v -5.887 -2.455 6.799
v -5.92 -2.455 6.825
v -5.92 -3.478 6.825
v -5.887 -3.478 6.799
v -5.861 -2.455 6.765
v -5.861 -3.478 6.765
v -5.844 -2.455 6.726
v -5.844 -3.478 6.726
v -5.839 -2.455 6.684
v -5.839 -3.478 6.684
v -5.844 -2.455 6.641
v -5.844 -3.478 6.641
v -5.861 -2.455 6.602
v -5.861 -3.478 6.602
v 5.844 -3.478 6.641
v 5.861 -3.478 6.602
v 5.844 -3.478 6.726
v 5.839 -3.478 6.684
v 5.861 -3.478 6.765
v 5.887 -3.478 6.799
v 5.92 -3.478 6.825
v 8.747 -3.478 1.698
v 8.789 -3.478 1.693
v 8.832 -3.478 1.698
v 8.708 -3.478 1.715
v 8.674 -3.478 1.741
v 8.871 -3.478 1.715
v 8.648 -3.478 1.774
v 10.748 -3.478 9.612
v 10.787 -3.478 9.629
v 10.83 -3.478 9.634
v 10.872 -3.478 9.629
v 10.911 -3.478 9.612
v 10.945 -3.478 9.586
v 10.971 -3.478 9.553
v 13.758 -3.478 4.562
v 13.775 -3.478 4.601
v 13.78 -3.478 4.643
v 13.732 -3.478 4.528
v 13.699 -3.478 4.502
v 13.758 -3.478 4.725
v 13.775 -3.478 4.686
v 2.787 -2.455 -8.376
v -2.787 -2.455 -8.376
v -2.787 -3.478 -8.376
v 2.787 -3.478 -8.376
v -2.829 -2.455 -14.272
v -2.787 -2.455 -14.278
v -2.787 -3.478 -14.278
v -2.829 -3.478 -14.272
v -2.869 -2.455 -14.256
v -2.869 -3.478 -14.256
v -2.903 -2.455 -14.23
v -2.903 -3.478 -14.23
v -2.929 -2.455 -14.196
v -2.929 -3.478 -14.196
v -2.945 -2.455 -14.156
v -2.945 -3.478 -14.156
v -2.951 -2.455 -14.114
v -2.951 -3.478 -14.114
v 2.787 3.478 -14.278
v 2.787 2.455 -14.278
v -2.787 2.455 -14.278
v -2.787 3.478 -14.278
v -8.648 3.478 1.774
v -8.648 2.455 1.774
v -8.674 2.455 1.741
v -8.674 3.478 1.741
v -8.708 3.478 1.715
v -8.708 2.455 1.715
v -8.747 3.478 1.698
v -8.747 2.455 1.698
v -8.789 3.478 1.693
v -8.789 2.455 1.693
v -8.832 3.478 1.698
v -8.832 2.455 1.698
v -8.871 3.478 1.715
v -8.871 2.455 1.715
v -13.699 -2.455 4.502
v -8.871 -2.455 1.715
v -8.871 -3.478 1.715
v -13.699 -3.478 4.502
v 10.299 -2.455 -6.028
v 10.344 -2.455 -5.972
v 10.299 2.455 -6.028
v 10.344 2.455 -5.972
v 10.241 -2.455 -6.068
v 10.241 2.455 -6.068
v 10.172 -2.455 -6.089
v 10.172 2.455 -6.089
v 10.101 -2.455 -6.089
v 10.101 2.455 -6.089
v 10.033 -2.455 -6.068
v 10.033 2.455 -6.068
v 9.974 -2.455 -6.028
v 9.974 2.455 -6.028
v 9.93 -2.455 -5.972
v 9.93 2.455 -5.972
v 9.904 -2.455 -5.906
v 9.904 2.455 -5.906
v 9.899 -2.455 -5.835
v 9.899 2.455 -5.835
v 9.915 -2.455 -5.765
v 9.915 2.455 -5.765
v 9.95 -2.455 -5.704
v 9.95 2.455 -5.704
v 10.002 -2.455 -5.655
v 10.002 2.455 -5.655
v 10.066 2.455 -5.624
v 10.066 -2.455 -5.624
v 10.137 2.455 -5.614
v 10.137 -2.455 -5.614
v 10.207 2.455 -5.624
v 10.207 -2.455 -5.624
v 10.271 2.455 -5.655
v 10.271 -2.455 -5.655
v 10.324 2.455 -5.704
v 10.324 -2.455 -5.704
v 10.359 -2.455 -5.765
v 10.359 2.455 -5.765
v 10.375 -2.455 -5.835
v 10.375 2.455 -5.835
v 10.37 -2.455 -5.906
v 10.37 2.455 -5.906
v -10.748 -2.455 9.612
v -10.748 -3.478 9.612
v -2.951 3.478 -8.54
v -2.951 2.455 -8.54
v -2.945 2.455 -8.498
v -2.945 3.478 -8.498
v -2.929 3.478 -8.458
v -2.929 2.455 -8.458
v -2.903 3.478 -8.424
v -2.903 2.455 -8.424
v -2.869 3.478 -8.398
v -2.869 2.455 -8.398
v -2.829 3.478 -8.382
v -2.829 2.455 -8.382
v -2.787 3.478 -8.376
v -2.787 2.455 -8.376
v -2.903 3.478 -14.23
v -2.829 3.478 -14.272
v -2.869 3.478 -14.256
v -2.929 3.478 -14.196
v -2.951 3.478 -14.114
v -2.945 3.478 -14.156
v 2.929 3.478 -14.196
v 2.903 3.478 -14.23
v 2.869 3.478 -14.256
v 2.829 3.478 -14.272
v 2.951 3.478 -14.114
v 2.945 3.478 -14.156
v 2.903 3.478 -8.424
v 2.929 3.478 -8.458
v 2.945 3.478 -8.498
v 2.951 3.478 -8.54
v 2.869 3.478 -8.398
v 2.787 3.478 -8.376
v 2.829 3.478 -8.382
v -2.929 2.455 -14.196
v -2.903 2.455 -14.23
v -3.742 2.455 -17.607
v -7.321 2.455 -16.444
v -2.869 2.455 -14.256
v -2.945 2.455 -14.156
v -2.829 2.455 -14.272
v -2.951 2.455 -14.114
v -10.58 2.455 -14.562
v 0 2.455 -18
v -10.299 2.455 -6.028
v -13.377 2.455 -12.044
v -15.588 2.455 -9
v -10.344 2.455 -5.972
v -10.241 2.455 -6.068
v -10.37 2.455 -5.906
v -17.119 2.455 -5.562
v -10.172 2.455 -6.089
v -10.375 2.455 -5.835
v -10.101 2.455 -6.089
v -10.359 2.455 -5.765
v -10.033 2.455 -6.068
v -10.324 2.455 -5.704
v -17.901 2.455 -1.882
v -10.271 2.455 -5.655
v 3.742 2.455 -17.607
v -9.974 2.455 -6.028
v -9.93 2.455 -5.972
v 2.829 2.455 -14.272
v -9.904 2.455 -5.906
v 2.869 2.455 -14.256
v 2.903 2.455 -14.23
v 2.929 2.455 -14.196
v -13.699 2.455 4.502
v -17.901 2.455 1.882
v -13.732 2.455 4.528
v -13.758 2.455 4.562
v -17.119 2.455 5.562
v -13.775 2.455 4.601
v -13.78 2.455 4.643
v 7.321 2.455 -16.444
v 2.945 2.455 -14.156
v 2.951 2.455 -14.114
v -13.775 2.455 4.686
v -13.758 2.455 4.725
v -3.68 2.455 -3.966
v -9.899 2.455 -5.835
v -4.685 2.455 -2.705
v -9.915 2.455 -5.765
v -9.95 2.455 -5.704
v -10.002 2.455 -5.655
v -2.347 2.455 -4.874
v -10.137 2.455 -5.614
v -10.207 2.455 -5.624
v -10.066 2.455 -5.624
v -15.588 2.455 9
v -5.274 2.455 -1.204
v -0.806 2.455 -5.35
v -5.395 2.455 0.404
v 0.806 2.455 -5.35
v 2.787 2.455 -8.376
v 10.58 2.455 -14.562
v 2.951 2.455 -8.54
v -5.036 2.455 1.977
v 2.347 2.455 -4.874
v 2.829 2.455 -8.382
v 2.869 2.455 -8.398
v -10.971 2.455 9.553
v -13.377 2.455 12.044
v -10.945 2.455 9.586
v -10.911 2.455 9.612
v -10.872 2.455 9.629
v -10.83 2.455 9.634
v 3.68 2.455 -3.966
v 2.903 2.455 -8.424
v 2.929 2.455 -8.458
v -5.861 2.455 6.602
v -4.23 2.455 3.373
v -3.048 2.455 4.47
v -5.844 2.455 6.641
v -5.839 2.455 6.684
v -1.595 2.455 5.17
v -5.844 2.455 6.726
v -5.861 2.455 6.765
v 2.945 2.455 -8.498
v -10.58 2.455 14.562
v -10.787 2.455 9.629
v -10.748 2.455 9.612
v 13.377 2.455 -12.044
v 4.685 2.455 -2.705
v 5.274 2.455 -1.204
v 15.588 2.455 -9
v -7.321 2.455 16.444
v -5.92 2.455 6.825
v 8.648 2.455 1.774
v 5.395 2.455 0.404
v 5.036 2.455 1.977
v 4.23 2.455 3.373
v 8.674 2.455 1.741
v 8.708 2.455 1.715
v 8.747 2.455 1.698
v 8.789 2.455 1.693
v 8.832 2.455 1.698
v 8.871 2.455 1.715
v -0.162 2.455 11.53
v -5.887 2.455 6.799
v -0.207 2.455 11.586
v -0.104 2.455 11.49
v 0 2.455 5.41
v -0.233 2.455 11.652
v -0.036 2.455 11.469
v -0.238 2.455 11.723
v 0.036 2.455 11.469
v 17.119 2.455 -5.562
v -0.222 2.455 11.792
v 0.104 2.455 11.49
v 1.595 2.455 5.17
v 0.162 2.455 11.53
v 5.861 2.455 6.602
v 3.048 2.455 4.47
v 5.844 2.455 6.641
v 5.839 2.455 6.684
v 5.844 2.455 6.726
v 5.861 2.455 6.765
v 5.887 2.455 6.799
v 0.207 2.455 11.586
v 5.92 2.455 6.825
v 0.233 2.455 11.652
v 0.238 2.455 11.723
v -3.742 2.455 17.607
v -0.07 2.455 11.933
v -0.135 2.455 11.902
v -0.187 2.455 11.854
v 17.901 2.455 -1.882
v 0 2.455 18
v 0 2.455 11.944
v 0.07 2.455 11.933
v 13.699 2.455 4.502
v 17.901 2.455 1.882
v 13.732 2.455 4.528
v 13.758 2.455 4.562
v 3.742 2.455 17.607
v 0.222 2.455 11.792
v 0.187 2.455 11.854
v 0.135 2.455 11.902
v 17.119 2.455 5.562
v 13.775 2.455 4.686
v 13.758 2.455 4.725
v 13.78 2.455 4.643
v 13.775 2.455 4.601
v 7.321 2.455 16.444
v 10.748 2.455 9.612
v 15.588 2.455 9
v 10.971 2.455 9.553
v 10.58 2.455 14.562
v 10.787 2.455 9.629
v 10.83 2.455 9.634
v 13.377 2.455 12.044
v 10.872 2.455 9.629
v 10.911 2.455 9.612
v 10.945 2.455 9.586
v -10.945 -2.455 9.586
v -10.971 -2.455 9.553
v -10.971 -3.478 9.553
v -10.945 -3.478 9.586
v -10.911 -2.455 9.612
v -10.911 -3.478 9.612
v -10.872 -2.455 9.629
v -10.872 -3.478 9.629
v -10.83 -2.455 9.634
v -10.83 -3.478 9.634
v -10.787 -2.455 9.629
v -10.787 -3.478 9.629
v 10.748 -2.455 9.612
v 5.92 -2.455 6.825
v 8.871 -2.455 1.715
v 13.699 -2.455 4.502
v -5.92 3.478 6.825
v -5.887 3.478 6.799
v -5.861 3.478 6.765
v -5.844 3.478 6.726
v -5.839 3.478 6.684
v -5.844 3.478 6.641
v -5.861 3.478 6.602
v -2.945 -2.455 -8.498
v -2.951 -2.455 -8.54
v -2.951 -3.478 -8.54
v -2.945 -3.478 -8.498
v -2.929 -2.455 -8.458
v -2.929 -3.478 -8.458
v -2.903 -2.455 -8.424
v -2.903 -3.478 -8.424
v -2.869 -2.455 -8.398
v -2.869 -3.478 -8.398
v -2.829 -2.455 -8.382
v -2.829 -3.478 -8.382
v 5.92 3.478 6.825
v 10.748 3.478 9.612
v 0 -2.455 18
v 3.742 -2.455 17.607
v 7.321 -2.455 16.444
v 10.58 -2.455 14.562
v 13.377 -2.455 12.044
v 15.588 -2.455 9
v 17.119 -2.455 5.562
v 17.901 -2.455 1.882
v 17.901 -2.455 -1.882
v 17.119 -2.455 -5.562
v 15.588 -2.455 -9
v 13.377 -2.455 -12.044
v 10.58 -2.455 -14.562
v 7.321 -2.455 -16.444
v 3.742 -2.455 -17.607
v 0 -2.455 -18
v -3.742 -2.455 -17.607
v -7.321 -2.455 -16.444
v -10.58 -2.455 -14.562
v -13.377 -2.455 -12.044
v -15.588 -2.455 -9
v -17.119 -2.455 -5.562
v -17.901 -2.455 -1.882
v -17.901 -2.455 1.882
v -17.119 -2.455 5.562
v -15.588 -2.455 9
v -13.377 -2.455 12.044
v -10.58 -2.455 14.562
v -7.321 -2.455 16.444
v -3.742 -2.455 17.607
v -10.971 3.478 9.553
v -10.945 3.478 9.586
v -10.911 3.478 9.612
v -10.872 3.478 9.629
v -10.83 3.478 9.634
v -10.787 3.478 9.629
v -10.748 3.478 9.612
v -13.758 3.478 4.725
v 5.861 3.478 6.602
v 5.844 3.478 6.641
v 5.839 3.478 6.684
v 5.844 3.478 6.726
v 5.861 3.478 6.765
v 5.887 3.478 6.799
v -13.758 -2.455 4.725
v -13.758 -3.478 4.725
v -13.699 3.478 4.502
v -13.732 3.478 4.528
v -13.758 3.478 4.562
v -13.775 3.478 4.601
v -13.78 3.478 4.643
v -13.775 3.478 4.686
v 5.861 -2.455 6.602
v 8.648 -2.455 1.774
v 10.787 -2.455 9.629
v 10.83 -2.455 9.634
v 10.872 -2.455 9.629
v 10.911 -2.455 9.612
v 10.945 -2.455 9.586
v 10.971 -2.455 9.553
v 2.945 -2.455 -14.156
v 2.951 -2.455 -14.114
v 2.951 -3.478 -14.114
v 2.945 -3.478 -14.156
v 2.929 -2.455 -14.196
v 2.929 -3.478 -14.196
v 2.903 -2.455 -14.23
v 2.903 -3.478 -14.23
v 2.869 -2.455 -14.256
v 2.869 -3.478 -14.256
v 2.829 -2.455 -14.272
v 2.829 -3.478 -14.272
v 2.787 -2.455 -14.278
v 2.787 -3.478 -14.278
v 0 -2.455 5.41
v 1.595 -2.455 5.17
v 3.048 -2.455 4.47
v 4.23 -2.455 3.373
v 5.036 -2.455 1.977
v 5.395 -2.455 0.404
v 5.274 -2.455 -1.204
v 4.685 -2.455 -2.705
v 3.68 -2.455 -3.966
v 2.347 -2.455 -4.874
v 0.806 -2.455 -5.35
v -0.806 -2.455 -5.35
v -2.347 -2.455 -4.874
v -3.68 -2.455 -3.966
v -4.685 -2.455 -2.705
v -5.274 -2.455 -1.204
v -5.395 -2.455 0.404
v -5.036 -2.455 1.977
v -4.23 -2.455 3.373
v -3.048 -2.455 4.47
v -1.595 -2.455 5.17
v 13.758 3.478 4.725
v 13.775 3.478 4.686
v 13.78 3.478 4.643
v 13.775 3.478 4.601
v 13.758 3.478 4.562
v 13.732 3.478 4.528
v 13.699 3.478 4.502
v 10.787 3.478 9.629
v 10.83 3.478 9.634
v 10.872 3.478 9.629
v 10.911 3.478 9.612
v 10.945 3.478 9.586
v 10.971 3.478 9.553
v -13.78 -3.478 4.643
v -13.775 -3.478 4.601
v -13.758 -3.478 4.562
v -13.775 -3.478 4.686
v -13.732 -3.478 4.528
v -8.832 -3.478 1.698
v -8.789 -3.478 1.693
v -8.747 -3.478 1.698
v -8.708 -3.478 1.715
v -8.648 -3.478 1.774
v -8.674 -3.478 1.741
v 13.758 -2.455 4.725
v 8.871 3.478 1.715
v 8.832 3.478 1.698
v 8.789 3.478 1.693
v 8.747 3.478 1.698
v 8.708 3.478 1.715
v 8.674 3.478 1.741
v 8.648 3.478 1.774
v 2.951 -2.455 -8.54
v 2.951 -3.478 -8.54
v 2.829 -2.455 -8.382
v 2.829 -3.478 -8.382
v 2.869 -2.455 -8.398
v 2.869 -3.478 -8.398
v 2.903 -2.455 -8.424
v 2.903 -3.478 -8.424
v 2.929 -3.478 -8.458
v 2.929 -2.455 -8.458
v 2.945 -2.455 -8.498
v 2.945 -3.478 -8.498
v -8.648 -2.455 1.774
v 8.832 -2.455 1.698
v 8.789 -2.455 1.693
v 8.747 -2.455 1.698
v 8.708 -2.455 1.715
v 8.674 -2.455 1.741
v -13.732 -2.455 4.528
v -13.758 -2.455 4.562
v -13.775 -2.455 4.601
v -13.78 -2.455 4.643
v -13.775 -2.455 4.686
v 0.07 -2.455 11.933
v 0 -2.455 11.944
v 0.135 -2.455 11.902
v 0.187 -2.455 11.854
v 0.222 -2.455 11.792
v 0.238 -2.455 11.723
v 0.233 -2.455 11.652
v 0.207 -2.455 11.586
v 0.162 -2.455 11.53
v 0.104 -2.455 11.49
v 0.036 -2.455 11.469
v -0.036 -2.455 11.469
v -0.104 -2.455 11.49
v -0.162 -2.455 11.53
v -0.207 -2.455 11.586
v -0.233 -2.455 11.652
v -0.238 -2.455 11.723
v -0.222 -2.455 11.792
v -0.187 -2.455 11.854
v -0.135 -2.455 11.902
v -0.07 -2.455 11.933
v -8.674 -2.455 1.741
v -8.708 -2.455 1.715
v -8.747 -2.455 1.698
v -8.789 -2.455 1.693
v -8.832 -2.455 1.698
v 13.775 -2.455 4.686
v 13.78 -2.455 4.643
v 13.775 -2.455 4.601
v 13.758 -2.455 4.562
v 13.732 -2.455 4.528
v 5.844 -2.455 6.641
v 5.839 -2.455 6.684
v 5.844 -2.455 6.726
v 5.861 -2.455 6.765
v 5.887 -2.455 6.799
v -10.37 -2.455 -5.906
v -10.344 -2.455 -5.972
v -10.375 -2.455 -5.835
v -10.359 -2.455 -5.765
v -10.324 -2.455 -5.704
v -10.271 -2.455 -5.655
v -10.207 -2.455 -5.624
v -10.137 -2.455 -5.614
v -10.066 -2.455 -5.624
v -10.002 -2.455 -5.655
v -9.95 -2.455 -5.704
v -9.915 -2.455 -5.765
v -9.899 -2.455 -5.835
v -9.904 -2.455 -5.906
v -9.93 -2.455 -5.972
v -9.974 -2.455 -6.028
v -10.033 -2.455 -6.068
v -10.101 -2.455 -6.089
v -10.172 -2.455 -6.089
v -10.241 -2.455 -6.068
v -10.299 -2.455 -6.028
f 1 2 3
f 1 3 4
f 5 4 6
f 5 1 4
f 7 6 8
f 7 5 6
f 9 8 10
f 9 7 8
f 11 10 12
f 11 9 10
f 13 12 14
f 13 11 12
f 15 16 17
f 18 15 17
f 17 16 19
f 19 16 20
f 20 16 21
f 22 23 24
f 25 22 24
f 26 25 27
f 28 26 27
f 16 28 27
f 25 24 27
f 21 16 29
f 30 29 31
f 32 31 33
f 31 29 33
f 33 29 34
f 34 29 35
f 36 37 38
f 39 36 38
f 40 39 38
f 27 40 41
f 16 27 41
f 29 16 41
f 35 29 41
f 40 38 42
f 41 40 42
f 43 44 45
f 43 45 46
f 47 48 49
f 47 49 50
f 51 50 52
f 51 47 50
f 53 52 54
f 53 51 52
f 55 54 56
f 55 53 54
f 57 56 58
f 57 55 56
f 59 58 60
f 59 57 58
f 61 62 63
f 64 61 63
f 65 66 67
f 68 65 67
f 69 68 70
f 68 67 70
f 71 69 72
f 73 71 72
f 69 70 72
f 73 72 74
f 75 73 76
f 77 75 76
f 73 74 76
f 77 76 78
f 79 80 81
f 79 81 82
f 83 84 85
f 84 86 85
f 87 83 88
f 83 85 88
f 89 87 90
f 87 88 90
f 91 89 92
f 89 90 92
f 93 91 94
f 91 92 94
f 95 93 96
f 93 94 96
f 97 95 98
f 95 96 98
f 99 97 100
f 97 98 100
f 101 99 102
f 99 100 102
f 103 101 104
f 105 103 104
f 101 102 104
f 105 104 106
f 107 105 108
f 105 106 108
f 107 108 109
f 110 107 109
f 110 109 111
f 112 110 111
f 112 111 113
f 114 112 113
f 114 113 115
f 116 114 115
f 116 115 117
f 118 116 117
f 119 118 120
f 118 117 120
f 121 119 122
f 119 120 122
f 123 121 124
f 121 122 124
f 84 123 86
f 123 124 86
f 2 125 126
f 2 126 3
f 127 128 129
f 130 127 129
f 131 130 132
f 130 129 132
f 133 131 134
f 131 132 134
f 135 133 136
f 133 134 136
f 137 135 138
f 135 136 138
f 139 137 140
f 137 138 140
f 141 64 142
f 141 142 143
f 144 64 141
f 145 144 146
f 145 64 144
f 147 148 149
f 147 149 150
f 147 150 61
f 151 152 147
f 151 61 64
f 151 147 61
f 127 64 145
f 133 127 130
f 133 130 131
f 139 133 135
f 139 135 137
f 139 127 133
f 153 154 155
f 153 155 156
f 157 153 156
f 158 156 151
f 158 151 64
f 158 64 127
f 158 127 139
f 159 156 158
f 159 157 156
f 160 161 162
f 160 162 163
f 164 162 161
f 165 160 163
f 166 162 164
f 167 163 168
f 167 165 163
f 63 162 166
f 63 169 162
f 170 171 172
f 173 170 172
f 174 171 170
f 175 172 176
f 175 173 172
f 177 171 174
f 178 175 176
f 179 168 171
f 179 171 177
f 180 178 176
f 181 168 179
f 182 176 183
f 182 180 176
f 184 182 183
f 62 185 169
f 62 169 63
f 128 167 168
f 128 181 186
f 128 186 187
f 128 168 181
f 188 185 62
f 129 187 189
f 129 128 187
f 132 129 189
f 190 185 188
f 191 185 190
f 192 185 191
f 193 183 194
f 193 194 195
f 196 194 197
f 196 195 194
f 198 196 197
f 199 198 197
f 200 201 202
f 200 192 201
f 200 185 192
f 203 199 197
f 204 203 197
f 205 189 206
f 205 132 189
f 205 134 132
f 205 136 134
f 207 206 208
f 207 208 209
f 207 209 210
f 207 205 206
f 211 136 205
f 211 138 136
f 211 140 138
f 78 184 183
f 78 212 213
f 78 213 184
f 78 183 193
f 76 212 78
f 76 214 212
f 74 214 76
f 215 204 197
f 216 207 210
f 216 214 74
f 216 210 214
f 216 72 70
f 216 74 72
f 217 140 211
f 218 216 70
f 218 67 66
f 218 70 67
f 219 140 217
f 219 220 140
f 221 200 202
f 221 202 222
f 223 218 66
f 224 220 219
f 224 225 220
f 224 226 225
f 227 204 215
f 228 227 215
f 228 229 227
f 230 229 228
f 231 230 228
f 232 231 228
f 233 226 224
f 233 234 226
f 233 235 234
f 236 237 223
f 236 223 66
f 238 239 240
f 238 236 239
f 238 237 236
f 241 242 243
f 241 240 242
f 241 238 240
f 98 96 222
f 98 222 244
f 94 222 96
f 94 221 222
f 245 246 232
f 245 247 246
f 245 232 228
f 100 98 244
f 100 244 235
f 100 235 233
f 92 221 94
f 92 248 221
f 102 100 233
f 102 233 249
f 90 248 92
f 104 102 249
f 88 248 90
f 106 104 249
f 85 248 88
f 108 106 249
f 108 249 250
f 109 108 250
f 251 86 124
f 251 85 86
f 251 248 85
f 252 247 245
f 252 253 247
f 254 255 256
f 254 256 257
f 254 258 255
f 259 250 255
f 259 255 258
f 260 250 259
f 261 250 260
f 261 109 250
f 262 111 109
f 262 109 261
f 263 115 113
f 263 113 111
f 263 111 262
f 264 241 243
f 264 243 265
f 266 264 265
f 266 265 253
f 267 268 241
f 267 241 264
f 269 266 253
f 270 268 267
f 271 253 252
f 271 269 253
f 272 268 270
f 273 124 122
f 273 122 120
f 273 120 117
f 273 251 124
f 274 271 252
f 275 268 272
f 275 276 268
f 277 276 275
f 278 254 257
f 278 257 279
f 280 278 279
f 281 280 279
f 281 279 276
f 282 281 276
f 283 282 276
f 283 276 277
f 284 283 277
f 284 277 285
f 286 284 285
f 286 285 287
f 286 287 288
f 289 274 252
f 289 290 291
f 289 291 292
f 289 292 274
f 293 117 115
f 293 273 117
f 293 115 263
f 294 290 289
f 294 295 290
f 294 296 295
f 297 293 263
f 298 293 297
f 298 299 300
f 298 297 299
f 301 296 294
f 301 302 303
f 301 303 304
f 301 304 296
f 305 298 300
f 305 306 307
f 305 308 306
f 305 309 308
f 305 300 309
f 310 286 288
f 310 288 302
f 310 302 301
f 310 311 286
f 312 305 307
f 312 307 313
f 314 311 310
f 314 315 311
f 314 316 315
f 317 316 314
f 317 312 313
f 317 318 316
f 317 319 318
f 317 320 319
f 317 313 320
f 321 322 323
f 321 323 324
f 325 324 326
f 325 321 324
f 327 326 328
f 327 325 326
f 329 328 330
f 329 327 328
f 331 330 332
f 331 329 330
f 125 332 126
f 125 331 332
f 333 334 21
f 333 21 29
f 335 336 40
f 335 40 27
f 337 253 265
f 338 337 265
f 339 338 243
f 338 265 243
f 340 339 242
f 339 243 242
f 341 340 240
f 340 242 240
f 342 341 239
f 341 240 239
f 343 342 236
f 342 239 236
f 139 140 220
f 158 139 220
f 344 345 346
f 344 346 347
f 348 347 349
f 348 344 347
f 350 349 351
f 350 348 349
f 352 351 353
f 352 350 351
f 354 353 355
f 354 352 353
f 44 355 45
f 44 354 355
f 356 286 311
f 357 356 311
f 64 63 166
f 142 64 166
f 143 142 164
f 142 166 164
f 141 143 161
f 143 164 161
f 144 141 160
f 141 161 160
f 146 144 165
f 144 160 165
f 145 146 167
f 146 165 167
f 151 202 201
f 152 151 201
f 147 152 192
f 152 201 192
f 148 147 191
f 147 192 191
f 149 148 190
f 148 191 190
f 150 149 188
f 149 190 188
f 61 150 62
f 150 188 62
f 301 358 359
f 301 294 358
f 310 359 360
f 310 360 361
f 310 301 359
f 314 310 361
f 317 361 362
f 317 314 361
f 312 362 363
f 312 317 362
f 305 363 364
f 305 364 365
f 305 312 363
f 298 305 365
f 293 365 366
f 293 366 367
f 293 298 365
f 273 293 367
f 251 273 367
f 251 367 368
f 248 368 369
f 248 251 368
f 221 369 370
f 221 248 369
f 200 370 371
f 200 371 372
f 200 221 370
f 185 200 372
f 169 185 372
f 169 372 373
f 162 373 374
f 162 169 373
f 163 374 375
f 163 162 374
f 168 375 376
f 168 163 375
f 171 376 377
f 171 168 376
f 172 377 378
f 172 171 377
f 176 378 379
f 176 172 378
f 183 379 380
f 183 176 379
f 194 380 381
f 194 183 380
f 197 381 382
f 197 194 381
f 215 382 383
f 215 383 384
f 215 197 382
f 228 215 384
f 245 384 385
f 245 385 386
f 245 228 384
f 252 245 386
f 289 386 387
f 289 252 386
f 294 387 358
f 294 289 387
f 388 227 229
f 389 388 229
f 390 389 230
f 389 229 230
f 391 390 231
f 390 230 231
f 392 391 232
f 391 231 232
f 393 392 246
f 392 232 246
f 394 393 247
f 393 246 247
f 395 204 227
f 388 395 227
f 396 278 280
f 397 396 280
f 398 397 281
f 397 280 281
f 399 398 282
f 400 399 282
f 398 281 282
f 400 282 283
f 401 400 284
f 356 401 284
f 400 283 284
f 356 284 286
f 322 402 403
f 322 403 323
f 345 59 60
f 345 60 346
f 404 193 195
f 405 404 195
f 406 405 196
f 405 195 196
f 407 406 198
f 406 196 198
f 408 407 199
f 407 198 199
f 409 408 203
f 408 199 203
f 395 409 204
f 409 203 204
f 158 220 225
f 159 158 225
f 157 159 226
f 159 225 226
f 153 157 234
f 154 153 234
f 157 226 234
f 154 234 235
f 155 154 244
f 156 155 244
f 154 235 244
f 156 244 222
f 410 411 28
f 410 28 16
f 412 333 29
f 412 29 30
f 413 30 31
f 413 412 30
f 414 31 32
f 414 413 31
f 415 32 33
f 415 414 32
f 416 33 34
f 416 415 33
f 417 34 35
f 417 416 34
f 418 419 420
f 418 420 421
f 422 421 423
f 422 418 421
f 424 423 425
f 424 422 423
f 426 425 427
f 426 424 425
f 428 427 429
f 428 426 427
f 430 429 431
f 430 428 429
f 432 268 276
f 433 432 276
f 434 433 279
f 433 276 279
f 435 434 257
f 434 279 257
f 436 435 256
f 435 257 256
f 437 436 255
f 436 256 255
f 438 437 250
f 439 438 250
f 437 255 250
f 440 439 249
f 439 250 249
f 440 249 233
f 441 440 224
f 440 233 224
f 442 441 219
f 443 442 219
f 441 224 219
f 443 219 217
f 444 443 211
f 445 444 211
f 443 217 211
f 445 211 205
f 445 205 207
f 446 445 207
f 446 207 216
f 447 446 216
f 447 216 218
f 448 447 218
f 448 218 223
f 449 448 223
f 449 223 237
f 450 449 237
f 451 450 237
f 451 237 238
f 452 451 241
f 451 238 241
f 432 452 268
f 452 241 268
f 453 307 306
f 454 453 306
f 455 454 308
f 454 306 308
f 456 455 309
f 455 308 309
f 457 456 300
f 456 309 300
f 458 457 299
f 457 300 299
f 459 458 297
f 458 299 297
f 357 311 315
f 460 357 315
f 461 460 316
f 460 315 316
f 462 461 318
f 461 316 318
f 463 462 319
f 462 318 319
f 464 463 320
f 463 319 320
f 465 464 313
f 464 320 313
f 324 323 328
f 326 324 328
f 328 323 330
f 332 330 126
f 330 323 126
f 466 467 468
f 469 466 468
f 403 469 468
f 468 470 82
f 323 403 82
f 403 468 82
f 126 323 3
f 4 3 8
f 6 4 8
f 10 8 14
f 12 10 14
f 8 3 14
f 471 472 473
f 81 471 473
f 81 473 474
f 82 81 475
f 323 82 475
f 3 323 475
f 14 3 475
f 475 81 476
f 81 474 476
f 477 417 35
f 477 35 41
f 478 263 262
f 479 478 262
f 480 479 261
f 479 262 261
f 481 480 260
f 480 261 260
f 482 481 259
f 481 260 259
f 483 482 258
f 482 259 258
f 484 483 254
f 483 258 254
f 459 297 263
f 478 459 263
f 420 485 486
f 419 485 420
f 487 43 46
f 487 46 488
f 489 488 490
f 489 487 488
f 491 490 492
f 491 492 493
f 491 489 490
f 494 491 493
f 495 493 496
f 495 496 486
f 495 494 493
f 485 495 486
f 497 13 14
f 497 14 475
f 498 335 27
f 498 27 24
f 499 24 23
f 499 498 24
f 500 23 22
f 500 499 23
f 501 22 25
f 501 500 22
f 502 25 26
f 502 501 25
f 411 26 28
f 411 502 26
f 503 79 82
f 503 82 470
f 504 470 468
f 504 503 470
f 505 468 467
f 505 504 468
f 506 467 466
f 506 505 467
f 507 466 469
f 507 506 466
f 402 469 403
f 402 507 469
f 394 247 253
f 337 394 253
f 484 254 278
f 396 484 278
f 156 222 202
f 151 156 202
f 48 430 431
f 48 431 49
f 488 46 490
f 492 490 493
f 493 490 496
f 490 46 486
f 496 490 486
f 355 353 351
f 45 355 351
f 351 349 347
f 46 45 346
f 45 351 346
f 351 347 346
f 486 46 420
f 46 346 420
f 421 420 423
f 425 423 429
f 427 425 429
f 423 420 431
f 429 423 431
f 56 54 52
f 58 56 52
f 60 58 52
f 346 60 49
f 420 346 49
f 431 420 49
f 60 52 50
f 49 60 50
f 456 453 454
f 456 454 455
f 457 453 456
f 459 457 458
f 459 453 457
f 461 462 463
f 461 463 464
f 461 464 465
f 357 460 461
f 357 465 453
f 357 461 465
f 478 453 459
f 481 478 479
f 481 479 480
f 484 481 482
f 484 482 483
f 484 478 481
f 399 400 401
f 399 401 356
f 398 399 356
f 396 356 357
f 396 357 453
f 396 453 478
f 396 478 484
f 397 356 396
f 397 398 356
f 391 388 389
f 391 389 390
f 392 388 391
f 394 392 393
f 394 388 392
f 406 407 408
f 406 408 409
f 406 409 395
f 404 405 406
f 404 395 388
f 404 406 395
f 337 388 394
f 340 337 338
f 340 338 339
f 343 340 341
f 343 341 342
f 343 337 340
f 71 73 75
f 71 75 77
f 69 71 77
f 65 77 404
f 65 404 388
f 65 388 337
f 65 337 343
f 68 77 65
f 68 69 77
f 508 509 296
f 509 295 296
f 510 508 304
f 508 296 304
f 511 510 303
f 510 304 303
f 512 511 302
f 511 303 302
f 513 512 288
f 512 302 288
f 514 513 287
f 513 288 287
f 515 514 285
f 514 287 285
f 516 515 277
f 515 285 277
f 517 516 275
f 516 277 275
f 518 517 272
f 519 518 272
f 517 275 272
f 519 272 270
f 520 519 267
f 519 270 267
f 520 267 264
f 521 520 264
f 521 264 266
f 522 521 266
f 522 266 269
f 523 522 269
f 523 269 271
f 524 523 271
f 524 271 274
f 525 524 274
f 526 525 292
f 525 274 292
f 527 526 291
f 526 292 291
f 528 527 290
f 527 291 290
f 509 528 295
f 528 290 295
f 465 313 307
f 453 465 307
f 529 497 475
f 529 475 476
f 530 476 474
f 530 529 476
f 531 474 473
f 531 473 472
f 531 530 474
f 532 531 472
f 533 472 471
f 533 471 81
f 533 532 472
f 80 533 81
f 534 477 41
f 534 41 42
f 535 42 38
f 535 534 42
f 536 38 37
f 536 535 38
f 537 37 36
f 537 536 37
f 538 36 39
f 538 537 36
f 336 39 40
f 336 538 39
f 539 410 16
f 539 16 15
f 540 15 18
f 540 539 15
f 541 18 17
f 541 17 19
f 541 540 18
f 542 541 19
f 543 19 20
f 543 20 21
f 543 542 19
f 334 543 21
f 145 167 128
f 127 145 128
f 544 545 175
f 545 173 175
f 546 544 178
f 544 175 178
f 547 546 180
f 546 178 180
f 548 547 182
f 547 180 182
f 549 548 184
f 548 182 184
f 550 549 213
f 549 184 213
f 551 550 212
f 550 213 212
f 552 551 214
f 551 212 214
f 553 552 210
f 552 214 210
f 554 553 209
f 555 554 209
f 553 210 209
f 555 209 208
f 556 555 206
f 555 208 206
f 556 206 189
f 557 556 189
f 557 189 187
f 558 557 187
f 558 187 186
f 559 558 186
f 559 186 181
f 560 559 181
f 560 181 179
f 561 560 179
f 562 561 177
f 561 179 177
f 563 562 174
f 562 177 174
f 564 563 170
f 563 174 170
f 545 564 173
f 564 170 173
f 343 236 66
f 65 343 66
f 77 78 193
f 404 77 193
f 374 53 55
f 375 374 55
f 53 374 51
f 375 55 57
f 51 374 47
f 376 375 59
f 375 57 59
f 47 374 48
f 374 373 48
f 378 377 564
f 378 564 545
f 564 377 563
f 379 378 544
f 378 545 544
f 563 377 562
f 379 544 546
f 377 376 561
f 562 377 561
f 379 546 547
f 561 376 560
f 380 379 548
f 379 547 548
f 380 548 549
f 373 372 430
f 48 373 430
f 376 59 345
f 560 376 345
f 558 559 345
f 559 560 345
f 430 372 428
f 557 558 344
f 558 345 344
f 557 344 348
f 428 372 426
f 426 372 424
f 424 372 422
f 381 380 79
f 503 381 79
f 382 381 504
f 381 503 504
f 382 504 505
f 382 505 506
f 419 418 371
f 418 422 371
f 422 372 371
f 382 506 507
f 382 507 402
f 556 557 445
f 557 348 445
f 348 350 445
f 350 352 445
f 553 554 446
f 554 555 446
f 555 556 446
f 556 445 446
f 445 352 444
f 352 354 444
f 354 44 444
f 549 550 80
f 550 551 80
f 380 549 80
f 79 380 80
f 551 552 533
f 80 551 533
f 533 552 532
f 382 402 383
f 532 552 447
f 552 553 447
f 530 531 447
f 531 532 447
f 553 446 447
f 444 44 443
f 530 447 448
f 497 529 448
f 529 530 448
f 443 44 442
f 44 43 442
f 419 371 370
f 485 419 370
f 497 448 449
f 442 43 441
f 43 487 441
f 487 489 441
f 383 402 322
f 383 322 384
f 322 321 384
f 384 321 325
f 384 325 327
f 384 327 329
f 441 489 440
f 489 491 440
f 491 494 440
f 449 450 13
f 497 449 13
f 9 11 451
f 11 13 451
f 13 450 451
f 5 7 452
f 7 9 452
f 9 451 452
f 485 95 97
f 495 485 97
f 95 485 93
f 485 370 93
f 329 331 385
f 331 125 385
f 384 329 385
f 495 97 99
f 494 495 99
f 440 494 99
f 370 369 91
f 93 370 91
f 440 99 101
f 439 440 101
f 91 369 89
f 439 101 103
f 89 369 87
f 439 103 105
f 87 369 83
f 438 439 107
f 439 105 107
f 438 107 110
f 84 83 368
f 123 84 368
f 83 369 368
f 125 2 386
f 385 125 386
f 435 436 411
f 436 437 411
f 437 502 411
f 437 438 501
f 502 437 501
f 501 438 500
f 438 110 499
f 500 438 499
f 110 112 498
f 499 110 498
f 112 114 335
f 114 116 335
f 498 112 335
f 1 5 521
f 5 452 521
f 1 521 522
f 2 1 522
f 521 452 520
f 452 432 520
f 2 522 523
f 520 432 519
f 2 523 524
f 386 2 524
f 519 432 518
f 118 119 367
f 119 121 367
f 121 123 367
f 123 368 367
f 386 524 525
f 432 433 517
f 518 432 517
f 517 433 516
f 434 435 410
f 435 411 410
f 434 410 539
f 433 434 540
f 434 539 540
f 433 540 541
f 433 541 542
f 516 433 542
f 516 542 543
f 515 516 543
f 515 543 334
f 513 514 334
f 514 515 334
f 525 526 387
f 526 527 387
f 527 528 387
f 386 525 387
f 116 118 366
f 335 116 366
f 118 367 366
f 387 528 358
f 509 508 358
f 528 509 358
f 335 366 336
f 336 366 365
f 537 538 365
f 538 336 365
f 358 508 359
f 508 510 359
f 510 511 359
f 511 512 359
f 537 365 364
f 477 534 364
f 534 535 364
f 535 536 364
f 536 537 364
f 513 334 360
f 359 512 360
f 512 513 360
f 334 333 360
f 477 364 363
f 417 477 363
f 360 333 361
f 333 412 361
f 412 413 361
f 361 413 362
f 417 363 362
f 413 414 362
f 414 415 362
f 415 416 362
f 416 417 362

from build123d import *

# Parameters (mm, degrees)
SKETCH1_R            = 18
BOSS_EXTRUDE1_DEPTH  = 2.45505
SKETCH3_R            = 0.238865
SKETCH3_R_2          = 5.4101
CUT_EXTRUDE1_DEPTH   = 26.57395688
CIRPATTERN1_COUNT    = 3
BOSS_EXTRUDE2_DEPTH  = 1.0229375
CIRPATTERN2_COUNT    = 3
MIRROR1_COPY_1_DEPTH = 1.0229375
MIRROR1_COPY_2_DEPTH = 1.0229375


with BuildPart() as part:
    # Sketch1 → Boss-Extrude1 (new, symmetric)
    with BuildSketch(Plane(origin=(0, 0, 0), x_dir=(1, 0, 0), z_dir=(0, 1, 0))):
        with Locations(Location((0, 0, 0), (0, 0, 270))):
            Circle(SKETCH1_R)
    extrude(amount=BOSS_EXTRUDE1_DEPTH, both=True)

    # Sketch3 → Cut-Extrude1 (cut, symmetric)
    with BuildSketch(Plane(origin=(0, 0, 0), x_dir=(1, 0, 0), z_dir=(0, 1, 0))):
        with Locations(Location((0, -11.70505, 0), (0, 0, 270))):
            Circle(SKETCH3_R)
        with Locations(Location((0, 0, 0), (0, 0, 270))):
            Circle(SKETCH3_R_2)
    cut_extrude1 = extrude(amount=CUT_EXTRUDE1_DEPTH, both=True, mode=Mode.SUBTRACT)

    # CirPattern1: Cut-Extrude1 ×3 about axis
    cirpattern1_axis = Axis((0, 0, 0), (0, 1, 0))
    for i in range(1, CIRPATTERN1_COUNT):
        add(cut_extrude1.rotate(cirpattern1_axis, i * 360 / CIRPATTERN1_COUNT), mode=Mode.SUBTRACT)

    # Sketch5 → Boss-Extrude2 (add)
    with BuildSketch(Plane(origin=(0, 2.45505, 0), x_dir=(1, 0, 0), z_dir=(0, 1, 0))):
        with BuildLine():
            Line((-8.871171075, -1.714531368), (-13.698548779, -4.501619185))
            ThreePointArc((-13.698548779, -4.501619185), (-13.774806859, -4.60100065), (-13.758456157, -4.725196563))
            Line((-13.758456157, -4.725196563), (-10.97136834, -9.552574267))
            ThreePointArc((-10.97136834, -9.552574267), (-10.871986875, -9.628832347), (-10.747790962, -9.612481645))
            Line((-10.747790962, -9.612481645), (-5.920413258, -6.825393828))
            ThreePointArc((-5.920413258, -6.825393828), (-5.844155178, -6.726012363), (-5.86050588, -6.60181645))
            Line((-5.86050588, -6.60181645), (-8.647593697, -1.774438746))
            ThreePointArc((-8.647593697, -1.774438746), (-8.746975162, -1.698180666), (-8.871171075, -1.714531368))
        make_face()
    boss_extrude2 = extrude(amount=BOSS_EXTRUDE2_DEPTH)

    # CirPattern2: Boss-Extrude2 ×3 about axis
    cirpattern2_axis = Axis((0, 0, 0), (0, 1, 0))
    for i in range(1, CIRPATTERN2_COUNT):
        add(boss_extrude2.rotate(cirpattern2_axis, i * 360 / CIRPATTERN2_COUNT))

    # Mirror1: Boss-Extrude2 across plane
    add(boss_extrude2.mirror(Plane.ZX))

    # Mirror1 copy 1 sketch → Mirror1 copy 1 (add)
    with BuildSketch(Plane(origin=(0, -2.45505, 0), x_dir=(-0.4999999999999998, 0, -0.8660254037844387), z_dir=(0, -1, 0))):
        with BuildLine():
            Line((-8.871171075, 1.714531368), (-13.698548779, 4.501619185))
            ThreePointArc((-13.698548779, 4.501619185), (-13.774806859, 4.60100065), (-13.758456157, 4.725196563))
            Line((-13.758456157, 4.725196563), (-10.97136834, 9.552574267))
            ThreePointArc((-10.97136834, 9.552574267), (-10.871986875, 9.628832347), (-10.747790962, 9.612481645))
            Line((-10.747790962, 9.612481645), (-5.920413258, 6.825393828))
            ThreePointArc((-5.920413258, 6.825393828), (-5.844155178, 6.726012363), (-5.86050588, 6.60181645))
            Line((-5.86050588, 6.60181645), (-8.647593697, 1.774438746))
            ThreePointArc((-8.647593697, 1.774438746), (-8.746975162, 1.698180666), (-8.871171075, 1.714531368))
        make_face()
    extrude(amount=MIRROR1_COPY_1_DEPTH)

    # Mirror1 copy 2 sketch → Mirror1 copy 2 (add)
    with BuildSketch(Plane(origin=(0, -2.45505, 0), x_dir=(-0.5000000000000004, 0, 0.8660254037844384), z_dir=(0, -1, 0))):
        with BuildLine():
            Line((-8.871171075, 1.714531368), (-13.698548779, 4.501619185))
            ThreePointArc((-13.698548779, 4.501619185), (-13.774806859, 4.60100065), (-13.758456157, 4.725196563))
            Line((-13.758456157, 4.725196563), (-10.97136834, 9.552574267))
            ThreePointArc((-10.97136834, 9.552574267), (-10.871986875, 9.628832347), (-10.747790962, 9.612481645))
            Line((-10.747790962, 9.612481645), (-5.920413258, 6.825393828))
            ThreePointArc((-5.920413258, 6.825393828), (-5.844155178, 6.726012363), (-5.86050588, 6.60181645))
            Line((-5.86050588, 6.60181645), (-8.647593697, 1.774438746))
            ThreePointArc((-8.647593697, 1.774438746), (-8.746975162, 1.698180666), (-8.871171075, 1.714531368))
        make_face()
    extrude(amount=MIRROR1_COPY_2_DEPTH)


solid = part.part
